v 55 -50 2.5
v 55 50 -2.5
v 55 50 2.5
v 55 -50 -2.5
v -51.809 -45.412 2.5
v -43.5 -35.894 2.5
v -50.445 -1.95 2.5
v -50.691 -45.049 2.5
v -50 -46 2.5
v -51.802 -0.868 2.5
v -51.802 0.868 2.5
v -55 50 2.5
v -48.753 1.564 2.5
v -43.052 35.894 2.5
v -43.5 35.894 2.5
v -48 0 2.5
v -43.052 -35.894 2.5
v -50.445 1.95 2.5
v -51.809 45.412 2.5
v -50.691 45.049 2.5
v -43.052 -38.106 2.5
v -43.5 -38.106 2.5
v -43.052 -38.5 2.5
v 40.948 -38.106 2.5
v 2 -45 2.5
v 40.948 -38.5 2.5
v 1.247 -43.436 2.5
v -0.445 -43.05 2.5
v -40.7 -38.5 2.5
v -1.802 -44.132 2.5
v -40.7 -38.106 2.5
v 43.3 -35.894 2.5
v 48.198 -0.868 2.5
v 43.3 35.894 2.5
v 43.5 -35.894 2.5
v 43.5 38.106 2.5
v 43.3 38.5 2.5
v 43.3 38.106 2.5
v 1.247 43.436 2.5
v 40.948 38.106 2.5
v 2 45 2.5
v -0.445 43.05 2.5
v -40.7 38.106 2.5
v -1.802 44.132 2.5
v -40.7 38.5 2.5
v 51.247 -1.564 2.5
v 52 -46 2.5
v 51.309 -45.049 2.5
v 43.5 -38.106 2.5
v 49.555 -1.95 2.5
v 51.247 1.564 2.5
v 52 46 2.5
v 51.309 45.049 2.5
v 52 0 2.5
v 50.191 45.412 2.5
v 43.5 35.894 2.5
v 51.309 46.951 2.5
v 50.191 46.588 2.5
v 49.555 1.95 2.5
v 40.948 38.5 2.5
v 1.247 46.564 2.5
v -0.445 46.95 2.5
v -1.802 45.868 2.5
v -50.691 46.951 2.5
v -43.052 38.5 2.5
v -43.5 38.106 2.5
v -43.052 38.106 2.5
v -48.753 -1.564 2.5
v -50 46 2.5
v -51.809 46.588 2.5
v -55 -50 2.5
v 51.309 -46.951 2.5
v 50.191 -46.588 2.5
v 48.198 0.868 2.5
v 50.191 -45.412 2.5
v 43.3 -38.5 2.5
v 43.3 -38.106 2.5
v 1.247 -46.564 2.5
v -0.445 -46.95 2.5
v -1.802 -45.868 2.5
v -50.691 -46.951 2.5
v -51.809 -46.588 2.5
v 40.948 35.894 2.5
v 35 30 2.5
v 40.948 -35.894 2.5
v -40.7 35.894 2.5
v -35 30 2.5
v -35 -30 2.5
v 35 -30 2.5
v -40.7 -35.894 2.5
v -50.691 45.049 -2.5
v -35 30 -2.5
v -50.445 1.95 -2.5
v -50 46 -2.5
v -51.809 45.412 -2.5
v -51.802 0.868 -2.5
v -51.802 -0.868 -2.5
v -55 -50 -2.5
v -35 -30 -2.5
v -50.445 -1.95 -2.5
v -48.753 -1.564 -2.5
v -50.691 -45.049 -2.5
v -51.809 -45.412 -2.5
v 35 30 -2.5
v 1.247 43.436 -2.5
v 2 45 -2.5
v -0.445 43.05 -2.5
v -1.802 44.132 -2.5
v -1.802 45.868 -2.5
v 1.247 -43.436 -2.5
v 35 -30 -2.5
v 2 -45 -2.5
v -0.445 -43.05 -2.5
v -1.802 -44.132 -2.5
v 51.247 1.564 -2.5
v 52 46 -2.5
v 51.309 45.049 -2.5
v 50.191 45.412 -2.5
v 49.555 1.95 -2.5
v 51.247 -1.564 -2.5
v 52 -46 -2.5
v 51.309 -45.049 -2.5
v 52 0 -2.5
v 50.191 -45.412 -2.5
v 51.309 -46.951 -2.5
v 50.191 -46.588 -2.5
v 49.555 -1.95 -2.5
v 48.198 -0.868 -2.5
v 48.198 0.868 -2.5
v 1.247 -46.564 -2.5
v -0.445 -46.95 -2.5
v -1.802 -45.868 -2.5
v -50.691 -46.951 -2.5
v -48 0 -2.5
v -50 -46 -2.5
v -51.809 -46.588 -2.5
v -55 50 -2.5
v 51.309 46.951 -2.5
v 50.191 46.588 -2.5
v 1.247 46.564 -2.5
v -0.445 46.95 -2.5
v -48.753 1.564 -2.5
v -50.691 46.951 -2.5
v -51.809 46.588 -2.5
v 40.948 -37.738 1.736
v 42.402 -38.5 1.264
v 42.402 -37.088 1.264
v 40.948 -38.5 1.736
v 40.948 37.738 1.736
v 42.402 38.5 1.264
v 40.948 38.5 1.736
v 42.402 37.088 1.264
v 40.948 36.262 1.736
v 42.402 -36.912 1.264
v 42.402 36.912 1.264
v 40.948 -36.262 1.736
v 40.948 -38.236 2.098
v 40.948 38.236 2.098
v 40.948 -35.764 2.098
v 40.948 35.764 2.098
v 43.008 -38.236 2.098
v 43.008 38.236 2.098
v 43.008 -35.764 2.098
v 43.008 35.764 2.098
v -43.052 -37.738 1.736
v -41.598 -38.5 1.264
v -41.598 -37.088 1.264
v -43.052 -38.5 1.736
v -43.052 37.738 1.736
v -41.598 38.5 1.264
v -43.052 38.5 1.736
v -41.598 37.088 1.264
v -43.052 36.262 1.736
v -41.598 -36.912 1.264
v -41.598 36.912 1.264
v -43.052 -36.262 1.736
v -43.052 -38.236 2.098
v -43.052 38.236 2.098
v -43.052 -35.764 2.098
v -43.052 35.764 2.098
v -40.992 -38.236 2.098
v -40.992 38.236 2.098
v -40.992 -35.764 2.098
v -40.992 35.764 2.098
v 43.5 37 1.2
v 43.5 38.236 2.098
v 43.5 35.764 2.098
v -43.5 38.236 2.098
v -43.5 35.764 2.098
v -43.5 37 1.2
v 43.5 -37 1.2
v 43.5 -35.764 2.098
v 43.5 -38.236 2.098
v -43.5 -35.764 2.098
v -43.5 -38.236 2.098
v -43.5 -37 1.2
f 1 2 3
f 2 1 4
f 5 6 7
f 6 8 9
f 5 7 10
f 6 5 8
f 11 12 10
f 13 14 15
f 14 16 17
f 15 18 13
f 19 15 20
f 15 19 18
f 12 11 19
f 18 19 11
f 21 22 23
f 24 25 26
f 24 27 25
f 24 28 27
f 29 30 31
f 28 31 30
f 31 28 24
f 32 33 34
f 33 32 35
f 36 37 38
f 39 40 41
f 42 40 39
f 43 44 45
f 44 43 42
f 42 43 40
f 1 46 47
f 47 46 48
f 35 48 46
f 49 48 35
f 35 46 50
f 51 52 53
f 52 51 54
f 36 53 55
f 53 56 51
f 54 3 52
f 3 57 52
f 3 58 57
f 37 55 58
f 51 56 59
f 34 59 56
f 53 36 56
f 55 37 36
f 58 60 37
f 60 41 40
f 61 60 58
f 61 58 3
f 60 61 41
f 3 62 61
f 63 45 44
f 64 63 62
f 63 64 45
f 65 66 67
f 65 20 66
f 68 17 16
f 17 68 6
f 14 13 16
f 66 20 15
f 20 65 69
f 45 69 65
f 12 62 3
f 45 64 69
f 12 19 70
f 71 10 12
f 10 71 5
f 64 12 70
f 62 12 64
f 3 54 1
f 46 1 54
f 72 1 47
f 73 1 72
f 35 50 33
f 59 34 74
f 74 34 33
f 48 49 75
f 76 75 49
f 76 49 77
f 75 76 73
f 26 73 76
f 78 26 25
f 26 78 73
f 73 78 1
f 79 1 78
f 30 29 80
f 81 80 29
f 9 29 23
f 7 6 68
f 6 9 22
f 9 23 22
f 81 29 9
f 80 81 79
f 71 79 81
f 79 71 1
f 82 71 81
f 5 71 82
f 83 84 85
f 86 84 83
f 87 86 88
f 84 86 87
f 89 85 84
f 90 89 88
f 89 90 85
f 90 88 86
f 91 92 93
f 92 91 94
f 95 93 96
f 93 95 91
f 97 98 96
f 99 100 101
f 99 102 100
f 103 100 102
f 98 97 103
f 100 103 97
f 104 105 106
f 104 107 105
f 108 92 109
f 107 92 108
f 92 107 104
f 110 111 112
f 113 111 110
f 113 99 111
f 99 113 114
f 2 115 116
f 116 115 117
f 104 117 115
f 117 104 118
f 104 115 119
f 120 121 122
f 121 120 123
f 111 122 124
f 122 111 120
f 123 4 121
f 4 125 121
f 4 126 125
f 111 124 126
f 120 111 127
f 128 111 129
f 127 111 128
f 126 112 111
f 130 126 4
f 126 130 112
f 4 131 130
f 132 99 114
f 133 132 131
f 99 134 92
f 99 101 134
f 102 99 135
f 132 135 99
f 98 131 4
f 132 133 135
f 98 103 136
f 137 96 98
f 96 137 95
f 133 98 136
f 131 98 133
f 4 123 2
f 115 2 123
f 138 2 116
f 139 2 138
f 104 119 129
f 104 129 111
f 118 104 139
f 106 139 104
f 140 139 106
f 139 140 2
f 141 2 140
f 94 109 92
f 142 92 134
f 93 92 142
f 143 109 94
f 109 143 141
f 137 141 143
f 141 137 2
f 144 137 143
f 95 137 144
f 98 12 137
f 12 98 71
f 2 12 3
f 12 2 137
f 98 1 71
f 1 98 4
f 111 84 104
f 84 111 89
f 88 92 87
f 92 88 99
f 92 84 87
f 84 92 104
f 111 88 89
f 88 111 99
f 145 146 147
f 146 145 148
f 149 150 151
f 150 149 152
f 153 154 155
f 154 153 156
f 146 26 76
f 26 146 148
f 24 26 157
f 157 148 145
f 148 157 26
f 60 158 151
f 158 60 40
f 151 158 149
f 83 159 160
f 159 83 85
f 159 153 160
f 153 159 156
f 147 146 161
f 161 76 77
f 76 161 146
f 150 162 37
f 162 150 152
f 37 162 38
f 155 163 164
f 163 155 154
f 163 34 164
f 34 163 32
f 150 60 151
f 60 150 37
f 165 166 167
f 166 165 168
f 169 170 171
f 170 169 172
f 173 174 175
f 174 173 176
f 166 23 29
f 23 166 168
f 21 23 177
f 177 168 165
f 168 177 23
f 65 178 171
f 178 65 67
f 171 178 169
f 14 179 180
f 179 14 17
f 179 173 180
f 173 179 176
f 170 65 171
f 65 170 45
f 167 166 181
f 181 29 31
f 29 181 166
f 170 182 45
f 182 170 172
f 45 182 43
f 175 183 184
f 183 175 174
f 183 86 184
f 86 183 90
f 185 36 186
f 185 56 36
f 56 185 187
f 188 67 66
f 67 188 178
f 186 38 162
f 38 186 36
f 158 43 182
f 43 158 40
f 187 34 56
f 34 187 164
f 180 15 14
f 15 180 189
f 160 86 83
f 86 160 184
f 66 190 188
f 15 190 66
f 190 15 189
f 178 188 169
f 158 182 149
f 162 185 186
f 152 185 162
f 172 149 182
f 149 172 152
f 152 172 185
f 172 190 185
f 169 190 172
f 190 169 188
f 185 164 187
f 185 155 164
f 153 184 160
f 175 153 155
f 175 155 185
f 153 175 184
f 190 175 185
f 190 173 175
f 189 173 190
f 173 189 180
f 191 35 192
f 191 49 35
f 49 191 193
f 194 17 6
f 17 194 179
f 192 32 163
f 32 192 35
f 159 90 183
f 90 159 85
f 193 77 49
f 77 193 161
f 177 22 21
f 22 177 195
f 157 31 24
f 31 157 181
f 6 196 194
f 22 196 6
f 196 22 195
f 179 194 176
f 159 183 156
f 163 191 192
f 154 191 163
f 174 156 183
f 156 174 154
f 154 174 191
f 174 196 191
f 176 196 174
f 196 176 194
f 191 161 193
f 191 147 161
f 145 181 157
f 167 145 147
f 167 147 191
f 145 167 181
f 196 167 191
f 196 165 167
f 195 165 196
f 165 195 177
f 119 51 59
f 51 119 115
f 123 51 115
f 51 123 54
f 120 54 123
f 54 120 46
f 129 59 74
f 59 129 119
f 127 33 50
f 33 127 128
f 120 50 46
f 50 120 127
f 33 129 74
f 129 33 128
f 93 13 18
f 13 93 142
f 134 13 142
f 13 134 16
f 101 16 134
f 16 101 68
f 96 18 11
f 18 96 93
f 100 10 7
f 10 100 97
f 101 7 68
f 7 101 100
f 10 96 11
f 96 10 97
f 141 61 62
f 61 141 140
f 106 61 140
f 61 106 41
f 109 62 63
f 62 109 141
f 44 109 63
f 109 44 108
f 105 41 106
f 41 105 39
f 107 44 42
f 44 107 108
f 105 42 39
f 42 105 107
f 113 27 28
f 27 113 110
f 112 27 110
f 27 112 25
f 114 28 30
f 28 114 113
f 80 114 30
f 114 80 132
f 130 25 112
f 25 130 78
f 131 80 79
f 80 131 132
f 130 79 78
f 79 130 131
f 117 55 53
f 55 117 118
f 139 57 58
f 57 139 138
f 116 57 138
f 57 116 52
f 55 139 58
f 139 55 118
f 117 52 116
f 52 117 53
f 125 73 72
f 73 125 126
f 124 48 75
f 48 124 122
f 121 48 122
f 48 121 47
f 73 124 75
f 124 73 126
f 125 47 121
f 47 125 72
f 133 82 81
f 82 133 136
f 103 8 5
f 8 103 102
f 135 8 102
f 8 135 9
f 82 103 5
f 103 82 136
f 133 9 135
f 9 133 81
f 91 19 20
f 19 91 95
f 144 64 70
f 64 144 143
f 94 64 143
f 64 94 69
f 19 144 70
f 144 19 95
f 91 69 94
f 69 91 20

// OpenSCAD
// file: metal_lid.scad
//Lid

module metal_lid(x,y,s_d, or_rad)
{
   difference(){
    difference(){
     difference(){
      difference(){ 
       difference(){
        difference(){
         difference(){
          difference(){ 
           difference(){
            difference(){
             difference(){
              difference(){
               difference(){
                difference(){
        cube([x,y,5], center = true);
        
        cube ([x-40,y-40,6], center = true);
        }
        
        //o ring holder
    
    translate([x/2-13,0,2.5]) 
    rotate([90,0,0])  
    cylinder(r=or_rad,h=(y-23), center=true);
}                  
    translate([-(x/2-13),0,2.5])
    rotate([90,0,0])
    cylinder(r=or_rad,h=(y-23), center=true);
}   
    translate([0,y/2-13,2.5])  
    rotate([0,90,0])
    cylinder(r=or_rad,h=(y-13), center=true);
}

    translate([0,-(y/2-13),2.5])   
    rotate([0,90,0])
    cylinder(r=or_rad,h=(y-13), center=true);

 }
    
 
  //screws holes for quartz
 //1
 translate([x/2-5,0,0])
 cylinder(r=s_d/2,h=6, center=true);
 }
//2
  translate([-(x/2-5),0,0])
 cylinder(r=s_d/2,h=6, center=true);
}
//3
translate([0,(y/2-5),0])
 cylinder(r=s_d/2,h=6, center=true);
}
//4
translate([0,-(y/2-5),0])
 cylinder(r=s_d/2,h=6, center=true);

}
    

}
//guide holes for screwing
//1
translate([x/2-4,y/2-4,0])
cylinder(r=1,h=6, center = true);
}
//2
translate([x/2-4,-(y/2-4),0])
cylinder(r=1,h=6, center = true);
}
//3
translate([-(x/2-4),-(y/2-4),0])
cylinder(r=1,h=6, center = true);
}
//4
translate([-(x/2-4),(y/2-4),0])
cylinder(r=1,h=6, center = true);
}

}

//metal_lid(110,100,4, 1.3);
// file: quartz_window.scad
//Quartz Window model
module window(x, y, t,s_d){
    //difference(){
       // difference(){
            //difference(){
                //difference(){
                        cube([x-16,y-16,t],center=true);
                    
//screws holes for quartz
 //1
 //translate([x/2-,0,0])
 //cylinder(r=s_d/2,h=t+1, center=true);
 //}
//2
  //translate([-(x/2-5),0,0])
 //cylinder(r=s_d/2,h=t+1, center=true);
//}
//3
//translate([0,(y/2-5),0])
 //cylinder(r=s_d/2,h=t+1, center=true);
//
//4
//translate([0,-(y/2-5),0])
 //cylinder(r=s_d/2,h=t+1, center=true);

//}
//}
}
//window(110,100,2,4.2);
// main file
//lid profile

//quartz plate
    include<quartz_window.scad>
    translate([0,0,5])
    %window(110,100,3);
    
    //metal lide
    include<metal_lid.scad>
    translate([0,0,0])
    rotate([0,0,0])
    metal_lid(110,100,4,1.3);
